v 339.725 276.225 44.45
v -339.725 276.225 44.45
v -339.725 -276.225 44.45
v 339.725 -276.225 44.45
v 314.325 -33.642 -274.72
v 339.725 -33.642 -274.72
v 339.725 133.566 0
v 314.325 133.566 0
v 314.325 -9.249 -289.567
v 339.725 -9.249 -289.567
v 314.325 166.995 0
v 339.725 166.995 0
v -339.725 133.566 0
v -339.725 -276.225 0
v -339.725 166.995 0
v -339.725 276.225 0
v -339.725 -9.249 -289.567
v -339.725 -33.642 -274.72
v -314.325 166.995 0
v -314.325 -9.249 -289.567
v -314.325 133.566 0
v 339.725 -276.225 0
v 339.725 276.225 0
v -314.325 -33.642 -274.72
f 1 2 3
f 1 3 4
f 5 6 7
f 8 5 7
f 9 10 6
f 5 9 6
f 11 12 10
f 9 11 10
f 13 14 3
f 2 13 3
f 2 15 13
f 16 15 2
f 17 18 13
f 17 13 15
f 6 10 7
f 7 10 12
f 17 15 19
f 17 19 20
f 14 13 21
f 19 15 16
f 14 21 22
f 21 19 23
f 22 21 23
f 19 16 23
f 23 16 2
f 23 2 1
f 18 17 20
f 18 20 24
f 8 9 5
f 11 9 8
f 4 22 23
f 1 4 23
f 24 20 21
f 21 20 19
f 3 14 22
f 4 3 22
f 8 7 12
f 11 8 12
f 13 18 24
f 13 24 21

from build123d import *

# Parameters (mm, degrees)
SKETCH1_W           = 679.45
SKETCH1_H           = 552.45
BOSS_EXTRUDE1_DEPTH = 44.45
BOSS_EXTRUDE2_DEPTH = 25.4
BOSS_EXTRUDE3_START = -679.45
BOSS_EXTRUDE3_DEPTH = 25.4


with BuildPart() as part:
    # Sketch1 → Boss-Extrude1 (new body)
    with BuildSketch(Plane.XY):
        Rectangle(SKETCH1_W, SKETCH1_H)
    extrude(amount=BOSS_EXTRUDE1_DEPTH)

    # Sketch2<2> → Boss-Extrude3 (add)
    with BuildSketch(Plane(origin=(339.725, 0, 0), x_dir=(0, 0, -1), z_dir=(1, 0, 0)).offset(BOSS_EXTRUDE3_START)):
        Polygon((0, 166.995205226), (289.566652053, -9.249482666), (274.720053486, -33.642160214), (0, 133.566148273), align=None)
    extrude(amount=BOSS_EXTRUDE3_DEPTH)


with BuildPart() as body_2:
    # Sketch2 → Boss-Extrude2 (new body)
    with BuildSketch(Plane(origin=(339.725, 0, 0), x_dir=(0, 0, -1), z_dir=(1, 0, 0))):
        Polygon((0, 166.995205226), (289.566652053, -9.249482666), (274.720053486, -33.642160214), (0, 133.566148273), align=None)
    extrude(amount=-BOSS_EXTRUDE2_DEPTH)


solid = Compound([part.part, body_2.part])
